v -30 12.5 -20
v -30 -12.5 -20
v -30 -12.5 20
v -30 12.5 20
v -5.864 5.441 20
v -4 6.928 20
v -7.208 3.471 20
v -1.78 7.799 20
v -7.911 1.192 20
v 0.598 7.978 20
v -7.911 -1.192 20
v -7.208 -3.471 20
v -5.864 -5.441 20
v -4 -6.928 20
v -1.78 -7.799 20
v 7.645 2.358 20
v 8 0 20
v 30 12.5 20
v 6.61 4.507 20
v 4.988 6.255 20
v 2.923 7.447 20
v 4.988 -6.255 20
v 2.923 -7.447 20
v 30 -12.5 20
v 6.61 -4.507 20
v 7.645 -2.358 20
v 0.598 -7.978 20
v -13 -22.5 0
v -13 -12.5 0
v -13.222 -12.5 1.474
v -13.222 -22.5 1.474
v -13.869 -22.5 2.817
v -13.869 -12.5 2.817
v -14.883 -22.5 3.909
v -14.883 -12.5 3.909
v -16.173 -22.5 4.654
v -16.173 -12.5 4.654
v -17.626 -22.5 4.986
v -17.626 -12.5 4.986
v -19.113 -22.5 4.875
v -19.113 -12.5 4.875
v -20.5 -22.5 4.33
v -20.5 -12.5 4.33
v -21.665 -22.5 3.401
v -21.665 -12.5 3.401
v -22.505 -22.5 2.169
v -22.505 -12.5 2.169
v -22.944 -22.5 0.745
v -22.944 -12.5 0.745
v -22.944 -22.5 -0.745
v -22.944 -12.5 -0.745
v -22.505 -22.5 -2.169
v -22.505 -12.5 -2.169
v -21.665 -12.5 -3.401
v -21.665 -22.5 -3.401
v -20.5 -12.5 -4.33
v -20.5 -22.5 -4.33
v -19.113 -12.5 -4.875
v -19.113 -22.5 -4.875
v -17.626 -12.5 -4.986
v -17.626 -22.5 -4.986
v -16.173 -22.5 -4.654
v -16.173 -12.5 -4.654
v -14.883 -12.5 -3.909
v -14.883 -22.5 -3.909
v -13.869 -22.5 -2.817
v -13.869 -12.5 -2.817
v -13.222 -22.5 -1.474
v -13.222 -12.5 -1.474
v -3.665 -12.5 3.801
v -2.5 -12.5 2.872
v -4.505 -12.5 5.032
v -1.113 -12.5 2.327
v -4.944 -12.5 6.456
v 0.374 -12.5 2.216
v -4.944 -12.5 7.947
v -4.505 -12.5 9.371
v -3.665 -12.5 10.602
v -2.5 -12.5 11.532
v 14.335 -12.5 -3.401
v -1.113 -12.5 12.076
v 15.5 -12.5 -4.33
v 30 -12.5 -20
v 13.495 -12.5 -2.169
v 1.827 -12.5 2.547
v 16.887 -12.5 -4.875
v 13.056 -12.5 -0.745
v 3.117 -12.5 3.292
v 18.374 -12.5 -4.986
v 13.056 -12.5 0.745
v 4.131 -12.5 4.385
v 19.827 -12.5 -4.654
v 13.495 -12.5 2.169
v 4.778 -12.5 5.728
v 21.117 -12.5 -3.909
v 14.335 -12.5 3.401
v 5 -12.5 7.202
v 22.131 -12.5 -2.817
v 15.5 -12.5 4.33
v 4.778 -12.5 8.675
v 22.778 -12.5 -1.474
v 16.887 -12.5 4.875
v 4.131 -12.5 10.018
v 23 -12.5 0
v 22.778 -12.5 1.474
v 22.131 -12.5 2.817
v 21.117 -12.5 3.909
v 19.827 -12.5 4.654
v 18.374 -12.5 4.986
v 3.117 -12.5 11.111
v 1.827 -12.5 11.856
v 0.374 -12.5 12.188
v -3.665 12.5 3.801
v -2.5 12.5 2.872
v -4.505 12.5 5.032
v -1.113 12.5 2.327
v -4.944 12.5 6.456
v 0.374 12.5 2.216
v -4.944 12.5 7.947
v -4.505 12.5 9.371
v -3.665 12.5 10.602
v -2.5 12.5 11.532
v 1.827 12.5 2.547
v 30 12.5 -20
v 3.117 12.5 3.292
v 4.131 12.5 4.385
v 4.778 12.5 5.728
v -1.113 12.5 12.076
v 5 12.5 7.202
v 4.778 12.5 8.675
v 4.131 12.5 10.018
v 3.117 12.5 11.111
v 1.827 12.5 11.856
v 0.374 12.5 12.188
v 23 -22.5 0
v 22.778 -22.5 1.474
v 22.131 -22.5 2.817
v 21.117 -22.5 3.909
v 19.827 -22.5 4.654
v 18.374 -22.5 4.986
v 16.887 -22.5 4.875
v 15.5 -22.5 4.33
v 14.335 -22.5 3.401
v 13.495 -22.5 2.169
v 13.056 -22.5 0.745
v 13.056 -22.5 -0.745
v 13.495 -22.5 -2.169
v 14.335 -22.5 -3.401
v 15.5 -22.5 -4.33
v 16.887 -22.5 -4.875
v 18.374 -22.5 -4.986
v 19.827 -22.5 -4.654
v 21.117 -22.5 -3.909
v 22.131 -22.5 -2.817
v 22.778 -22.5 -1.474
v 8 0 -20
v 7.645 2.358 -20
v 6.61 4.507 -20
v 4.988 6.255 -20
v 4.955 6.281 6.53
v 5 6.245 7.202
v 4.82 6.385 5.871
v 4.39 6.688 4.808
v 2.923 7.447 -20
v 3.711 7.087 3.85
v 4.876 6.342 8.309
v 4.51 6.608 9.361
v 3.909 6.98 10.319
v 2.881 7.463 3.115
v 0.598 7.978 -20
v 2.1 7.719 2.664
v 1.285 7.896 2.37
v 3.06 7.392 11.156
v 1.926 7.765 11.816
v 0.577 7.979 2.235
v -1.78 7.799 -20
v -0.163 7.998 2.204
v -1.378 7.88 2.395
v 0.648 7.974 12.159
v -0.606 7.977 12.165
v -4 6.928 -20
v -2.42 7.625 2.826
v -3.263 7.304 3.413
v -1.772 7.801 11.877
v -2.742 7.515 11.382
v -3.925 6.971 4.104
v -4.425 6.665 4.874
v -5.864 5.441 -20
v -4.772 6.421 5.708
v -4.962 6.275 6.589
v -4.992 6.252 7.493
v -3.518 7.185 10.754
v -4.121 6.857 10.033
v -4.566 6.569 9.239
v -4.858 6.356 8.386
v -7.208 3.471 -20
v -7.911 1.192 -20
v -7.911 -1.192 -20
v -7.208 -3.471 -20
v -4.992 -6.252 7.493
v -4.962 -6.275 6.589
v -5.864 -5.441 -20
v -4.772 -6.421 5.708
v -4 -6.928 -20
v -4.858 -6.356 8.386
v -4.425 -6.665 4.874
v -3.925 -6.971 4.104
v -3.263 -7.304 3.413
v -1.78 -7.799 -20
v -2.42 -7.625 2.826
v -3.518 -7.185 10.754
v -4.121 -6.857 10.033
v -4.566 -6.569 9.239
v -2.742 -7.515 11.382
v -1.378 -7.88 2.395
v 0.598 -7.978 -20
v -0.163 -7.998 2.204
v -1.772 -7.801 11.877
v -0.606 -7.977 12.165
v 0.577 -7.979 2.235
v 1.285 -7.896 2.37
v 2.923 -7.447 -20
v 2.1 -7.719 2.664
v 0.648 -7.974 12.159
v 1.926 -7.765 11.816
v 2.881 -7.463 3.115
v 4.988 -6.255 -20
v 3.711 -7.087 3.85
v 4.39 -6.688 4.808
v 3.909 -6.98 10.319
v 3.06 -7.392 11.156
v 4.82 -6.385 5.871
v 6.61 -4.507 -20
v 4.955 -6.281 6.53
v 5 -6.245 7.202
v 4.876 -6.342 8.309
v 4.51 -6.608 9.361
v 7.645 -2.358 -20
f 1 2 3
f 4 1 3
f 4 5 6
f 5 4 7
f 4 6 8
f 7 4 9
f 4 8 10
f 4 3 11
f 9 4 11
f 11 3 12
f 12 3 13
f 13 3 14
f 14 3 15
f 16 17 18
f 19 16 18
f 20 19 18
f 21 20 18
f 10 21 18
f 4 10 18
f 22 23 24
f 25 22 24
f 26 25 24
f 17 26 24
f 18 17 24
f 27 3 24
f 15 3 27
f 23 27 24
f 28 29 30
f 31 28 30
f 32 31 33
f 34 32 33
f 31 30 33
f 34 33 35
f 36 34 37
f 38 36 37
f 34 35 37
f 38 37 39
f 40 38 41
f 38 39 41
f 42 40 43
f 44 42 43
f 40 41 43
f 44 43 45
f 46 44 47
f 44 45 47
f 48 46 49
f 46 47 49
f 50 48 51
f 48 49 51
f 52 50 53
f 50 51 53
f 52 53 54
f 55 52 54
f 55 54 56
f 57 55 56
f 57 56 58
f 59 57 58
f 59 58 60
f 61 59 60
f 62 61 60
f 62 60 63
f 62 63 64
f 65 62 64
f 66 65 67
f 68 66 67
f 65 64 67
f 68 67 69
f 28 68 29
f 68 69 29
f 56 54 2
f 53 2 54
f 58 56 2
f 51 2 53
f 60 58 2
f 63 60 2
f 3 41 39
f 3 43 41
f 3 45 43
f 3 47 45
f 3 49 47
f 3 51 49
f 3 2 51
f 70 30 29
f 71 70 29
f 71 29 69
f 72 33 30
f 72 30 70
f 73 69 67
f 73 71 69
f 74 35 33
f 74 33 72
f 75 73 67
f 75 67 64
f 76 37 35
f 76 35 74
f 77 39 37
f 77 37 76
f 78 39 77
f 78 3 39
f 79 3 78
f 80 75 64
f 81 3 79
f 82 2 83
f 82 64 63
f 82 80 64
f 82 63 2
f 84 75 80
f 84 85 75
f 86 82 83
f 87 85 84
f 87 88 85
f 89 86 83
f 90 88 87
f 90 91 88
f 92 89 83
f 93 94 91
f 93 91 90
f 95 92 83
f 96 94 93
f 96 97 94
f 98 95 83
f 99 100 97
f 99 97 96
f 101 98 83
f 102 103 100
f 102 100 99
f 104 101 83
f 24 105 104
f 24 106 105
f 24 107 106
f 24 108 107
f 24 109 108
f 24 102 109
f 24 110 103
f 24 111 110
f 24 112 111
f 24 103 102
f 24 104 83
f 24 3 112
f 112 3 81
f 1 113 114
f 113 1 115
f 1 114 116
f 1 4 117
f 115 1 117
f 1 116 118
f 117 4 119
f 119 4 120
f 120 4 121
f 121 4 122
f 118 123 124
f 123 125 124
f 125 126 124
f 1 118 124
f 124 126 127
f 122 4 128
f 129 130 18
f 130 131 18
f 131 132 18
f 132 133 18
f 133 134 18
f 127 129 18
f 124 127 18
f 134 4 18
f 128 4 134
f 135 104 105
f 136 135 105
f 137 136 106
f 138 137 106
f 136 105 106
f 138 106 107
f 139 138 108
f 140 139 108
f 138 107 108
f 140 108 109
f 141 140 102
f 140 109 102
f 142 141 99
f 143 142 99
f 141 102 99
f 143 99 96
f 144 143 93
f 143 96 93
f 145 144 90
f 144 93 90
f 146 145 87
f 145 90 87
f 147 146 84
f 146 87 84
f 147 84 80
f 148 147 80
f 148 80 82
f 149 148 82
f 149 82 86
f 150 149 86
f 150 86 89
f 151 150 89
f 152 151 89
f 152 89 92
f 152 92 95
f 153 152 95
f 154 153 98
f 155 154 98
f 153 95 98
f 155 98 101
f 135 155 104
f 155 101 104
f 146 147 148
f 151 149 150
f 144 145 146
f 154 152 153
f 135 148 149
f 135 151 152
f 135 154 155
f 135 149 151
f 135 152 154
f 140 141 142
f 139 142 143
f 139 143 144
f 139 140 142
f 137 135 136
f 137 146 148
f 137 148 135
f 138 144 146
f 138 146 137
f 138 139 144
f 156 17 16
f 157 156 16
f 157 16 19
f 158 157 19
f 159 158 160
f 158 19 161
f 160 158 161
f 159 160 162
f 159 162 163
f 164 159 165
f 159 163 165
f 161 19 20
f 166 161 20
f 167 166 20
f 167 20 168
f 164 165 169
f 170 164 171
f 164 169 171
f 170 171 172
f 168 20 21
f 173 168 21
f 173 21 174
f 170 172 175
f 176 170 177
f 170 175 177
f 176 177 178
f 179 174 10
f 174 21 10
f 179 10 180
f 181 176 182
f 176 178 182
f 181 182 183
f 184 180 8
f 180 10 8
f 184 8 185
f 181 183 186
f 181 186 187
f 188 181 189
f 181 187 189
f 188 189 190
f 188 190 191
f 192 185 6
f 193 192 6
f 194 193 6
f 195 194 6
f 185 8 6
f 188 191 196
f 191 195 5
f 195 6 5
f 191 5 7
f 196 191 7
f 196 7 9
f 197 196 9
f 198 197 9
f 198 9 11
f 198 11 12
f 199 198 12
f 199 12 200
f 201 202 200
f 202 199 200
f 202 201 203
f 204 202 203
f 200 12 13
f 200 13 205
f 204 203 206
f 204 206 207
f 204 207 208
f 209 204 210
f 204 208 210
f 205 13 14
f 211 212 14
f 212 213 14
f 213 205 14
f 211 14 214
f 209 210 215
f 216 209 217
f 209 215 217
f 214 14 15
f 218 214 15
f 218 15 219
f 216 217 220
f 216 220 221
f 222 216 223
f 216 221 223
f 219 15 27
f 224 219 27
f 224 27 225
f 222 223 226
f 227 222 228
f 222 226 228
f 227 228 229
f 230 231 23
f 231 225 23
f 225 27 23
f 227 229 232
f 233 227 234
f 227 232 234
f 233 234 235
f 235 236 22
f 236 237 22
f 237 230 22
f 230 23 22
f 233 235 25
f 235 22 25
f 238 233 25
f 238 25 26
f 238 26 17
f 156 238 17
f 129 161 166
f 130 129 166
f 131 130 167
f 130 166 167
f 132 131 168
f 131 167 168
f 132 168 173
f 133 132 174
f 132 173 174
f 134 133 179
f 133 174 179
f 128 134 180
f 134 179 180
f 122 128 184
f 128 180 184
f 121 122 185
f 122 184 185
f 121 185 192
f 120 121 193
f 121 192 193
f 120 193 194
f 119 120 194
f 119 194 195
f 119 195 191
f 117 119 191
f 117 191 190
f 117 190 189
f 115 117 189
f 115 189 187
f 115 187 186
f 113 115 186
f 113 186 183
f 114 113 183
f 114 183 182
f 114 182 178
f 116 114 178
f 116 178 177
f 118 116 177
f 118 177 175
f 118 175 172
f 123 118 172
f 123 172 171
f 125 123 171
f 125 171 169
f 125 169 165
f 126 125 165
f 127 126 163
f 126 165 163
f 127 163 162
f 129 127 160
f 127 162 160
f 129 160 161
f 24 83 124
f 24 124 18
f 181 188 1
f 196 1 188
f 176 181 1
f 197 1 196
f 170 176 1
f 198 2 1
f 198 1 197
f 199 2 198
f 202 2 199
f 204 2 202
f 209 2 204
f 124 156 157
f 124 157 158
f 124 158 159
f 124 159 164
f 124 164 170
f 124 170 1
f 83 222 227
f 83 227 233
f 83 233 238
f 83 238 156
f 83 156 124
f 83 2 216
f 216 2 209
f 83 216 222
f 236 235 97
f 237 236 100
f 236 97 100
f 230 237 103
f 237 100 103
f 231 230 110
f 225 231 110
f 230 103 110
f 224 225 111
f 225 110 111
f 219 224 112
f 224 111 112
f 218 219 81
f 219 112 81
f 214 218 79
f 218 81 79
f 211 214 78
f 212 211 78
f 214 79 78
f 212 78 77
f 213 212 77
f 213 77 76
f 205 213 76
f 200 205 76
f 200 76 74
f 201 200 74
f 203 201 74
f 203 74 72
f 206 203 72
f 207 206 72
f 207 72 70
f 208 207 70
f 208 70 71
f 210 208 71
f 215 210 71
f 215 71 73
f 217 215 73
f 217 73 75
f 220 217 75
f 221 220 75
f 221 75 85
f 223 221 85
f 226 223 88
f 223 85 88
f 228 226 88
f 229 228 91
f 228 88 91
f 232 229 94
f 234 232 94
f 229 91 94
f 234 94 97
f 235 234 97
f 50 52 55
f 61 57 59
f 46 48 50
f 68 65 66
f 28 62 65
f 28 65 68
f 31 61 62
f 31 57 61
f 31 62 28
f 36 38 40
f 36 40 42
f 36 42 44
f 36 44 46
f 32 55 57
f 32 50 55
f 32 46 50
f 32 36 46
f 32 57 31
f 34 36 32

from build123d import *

# Parameters (mm, degrees)
F0_W     = 60
F0_H     = 40
F1_DEPTH = 12.5
F2_R     = 8
F3_DEPTH = 40.001
F4_R     = 5
F5_DEPTH = 10
F6_R     = 5
F7_DEPTH = 25


with BuildPart() as f1:
    # F0 (on Front) → F1 (new body, symmetric)
    with BuildSketch(Plane.XZ):
        Rectangle(F0_W, F0_H)
    extrude(amount=F1_DEPTH, both=True)

    # F2 (on face) → F3 (cut, through all)
    with BuildSketch(Plane.XY.offset(20)):
        Circle(F2_R)
    extrude(amount=-F3_DEPTH, mode=Mode.SUBTRACT)

    # F4 (on face) → F5 (join)
    with BuildSketch(Plane.XZ.offset(12.5)):
        with Locations((-18, 0)):
            Circle(F4_R)
        with Locations((18, 0)):
            Circle(F4_R)
    extrude(amount=F5_DEPTH)

    # F6 (on face) → F7 (cut)
    with BuildSketch(Plane.XZ.offset(12.5)):
        with Locations((0, 7.201633)):
            Circle(F6_R)
    extrude(amount=-F7_DEPTH, mode=Mode.SUBTRACT)


solid = f1.part
